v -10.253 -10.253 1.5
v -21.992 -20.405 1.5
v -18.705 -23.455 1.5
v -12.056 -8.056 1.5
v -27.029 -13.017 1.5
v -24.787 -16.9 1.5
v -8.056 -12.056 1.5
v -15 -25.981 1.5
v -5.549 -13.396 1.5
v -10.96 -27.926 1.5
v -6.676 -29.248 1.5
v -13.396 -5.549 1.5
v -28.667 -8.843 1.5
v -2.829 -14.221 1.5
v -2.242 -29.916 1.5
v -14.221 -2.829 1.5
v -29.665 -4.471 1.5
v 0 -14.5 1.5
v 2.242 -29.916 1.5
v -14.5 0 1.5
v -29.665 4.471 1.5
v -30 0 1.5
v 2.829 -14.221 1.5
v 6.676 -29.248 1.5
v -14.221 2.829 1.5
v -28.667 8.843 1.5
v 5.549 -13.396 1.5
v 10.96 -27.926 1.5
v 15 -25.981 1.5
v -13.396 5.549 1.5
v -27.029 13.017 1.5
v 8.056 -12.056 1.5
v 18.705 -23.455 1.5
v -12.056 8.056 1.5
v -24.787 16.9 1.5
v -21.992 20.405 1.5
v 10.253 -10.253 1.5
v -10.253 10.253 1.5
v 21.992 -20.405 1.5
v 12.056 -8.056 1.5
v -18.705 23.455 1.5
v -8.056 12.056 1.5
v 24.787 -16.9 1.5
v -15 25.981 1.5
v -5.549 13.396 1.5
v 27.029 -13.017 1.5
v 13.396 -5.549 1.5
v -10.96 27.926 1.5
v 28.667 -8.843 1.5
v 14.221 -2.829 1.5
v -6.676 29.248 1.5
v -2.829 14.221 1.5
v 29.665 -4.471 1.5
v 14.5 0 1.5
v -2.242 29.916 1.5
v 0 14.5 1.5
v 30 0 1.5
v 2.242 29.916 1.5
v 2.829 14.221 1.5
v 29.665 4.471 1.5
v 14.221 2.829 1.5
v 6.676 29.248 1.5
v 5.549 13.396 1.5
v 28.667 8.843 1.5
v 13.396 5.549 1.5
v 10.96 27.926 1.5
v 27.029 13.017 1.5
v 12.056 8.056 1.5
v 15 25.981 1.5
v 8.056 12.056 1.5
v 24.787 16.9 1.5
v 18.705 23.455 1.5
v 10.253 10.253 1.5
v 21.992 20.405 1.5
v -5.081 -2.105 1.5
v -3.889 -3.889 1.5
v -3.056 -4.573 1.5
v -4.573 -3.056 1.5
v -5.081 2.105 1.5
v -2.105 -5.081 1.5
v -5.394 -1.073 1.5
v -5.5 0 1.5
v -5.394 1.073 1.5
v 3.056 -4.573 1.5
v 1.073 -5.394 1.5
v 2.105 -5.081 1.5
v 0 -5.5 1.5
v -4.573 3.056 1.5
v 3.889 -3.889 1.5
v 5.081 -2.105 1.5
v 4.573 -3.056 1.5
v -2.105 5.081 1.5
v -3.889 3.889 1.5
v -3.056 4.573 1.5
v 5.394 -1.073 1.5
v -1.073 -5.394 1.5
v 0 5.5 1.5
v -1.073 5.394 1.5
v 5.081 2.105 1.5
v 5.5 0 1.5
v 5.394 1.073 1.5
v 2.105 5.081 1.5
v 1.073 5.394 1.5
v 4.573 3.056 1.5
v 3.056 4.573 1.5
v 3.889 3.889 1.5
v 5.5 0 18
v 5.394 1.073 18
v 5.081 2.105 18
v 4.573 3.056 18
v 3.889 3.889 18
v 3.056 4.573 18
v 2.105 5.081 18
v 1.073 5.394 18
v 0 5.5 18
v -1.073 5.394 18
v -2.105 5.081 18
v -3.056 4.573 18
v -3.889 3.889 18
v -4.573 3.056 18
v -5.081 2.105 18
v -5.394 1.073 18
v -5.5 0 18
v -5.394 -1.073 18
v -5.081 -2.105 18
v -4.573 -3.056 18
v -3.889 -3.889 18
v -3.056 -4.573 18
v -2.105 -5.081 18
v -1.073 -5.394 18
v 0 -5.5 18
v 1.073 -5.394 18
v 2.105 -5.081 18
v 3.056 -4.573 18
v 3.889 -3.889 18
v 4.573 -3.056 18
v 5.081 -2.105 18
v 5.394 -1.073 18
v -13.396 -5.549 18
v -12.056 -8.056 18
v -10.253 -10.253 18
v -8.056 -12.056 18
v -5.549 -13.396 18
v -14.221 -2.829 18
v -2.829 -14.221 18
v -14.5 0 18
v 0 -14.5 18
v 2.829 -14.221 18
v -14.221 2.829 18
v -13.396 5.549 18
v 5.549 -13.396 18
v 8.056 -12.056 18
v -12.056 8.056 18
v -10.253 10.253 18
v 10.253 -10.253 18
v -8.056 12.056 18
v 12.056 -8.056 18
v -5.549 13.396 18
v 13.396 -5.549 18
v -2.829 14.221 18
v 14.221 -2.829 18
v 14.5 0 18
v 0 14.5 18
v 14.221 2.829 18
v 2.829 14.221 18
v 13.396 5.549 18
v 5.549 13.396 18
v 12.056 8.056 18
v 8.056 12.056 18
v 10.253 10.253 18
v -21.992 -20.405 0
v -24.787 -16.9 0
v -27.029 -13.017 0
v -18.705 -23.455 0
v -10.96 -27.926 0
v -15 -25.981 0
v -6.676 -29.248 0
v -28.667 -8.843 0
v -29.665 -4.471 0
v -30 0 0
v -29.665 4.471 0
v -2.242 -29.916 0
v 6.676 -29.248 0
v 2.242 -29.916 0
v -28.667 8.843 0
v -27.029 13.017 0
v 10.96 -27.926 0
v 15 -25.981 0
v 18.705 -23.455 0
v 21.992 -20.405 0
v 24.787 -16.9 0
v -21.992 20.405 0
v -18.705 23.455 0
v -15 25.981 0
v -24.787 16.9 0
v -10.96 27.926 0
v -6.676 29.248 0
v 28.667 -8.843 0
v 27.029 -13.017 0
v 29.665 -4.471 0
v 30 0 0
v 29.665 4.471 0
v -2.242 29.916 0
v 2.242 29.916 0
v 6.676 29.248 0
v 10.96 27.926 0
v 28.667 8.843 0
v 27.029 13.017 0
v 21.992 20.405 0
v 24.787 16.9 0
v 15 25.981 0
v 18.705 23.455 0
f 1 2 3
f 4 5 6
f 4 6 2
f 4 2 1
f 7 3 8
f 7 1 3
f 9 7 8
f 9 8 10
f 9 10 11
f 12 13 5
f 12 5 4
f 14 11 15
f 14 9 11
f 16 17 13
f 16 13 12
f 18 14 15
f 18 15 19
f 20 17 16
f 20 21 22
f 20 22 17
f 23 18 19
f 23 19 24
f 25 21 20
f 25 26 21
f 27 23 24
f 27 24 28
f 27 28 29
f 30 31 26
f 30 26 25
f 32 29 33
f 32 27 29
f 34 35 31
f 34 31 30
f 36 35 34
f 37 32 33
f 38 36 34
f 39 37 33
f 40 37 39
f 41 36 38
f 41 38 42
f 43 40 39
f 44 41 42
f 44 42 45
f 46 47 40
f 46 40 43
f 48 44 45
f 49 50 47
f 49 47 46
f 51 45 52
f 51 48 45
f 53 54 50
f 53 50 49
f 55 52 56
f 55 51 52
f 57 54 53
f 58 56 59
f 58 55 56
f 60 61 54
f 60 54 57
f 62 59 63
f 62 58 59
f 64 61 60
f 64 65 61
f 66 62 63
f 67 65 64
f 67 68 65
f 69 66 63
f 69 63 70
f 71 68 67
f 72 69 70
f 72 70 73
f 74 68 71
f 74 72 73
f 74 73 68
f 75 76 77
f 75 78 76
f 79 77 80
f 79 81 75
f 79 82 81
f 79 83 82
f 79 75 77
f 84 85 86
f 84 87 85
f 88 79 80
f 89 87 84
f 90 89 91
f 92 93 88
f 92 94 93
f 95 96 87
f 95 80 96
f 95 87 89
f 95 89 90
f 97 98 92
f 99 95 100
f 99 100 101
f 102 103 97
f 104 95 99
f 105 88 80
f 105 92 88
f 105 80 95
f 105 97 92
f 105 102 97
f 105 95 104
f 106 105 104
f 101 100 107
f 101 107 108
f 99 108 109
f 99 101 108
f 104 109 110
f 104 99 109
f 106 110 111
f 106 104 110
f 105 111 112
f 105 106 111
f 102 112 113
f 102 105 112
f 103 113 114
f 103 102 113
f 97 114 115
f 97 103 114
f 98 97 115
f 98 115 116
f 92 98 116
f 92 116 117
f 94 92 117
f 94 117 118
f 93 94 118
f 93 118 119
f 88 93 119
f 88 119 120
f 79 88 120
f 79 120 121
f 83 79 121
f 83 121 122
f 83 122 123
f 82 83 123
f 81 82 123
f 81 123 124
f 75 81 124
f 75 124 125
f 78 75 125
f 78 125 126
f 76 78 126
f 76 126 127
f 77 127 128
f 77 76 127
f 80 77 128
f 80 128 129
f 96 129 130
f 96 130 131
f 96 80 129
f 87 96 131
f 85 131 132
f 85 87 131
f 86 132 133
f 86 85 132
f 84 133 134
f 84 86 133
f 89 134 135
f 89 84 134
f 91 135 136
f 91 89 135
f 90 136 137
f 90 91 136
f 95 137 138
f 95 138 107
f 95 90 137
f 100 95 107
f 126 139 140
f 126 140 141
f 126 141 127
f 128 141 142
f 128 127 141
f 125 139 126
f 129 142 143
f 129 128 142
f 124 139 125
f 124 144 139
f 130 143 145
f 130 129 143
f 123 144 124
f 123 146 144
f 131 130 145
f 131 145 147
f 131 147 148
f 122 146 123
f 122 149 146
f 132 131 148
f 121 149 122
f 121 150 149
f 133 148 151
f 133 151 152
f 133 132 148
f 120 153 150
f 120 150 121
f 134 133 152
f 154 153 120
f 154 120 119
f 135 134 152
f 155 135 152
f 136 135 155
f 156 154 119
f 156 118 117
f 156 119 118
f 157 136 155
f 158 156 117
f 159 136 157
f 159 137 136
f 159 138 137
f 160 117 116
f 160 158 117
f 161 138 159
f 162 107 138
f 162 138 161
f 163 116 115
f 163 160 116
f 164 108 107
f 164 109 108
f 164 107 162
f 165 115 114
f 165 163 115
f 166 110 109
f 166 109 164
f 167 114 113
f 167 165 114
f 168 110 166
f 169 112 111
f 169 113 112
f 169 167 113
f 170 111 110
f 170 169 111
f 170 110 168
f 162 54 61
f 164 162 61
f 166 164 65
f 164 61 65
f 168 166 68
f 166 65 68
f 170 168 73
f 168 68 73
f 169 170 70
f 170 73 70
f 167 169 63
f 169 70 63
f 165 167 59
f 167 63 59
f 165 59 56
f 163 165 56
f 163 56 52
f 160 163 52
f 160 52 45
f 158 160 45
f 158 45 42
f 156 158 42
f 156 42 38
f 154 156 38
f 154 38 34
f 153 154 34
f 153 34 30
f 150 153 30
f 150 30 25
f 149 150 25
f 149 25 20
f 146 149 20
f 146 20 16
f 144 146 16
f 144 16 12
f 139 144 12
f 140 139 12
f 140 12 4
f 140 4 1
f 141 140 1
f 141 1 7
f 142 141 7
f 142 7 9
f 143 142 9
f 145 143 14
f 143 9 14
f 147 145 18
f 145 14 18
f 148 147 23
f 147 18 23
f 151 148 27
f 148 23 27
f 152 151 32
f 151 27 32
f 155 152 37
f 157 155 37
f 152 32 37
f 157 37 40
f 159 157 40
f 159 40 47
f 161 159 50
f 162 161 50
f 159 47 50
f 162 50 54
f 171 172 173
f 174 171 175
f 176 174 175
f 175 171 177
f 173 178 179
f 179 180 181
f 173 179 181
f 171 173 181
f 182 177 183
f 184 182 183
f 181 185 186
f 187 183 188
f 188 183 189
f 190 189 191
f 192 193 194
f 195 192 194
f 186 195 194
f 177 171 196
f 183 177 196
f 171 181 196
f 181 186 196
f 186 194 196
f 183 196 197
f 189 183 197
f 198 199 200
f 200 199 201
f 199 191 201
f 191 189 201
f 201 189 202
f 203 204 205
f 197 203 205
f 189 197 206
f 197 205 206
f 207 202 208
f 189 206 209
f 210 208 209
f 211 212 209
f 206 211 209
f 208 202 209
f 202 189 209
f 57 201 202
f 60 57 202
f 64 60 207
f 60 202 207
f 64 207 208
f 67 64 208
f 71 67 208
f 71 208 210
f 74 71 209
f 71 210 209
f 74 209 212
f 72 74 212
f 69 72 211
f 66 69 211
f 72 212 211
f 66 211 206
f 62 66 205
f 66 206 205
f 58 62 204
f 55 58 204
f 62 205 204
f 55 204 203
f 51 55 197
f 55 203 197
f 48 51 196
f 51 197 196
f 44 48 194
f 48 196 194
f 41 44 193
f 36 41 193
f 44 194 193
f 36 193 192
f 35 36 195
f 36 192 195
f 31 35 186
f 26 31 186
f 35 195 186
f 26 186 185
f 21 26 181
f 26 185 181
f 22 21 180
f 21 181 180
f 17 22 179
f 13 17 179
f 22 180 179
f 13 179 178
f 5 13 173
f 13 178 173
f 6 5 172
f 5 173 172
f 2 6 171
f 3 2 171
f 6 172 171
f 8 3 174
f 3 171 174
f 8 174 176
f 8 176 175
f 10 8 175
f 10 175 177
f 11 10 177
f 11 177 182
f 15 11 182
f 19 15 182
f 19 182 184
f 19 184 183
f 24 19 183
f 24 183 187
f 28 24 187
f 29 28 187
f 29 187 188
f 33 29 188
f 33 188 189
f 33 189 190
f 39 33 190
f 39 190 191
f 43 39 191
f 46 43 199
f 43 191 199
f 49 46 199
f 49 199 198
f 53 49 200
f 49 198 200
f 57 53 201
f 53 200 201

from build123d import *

# Parameters (mm, degrees)
SKETCH1_R           = 30
BOSS_EXTRUDE1_DEPTH = 1.5
SKETCH2_R           = 14.5
SKETCH2_R_2         = 5.5
EXTRUDE_THIN1_DEPTH = 18


with BuildPart() as part:
    # Sketch1 → Boss-Extrude1 (new body)
    with BuildSketch(Plane.XY):
        Circle(SKETCH1_R)
    extrude(amount=BOSS_EXTRUDE1_DEPTH)

    # Sketch2 → Extrude-Thin1 (add)
    with BuildSketch(Plane.XY):
        Circle(SKETCH2_R)
        Circle(SKETCH2_R_2, mode=Mode.SUBTRACT)
    extrude(amount=EXTRUDE_THIN1_DEPTH)


solid = part.part
